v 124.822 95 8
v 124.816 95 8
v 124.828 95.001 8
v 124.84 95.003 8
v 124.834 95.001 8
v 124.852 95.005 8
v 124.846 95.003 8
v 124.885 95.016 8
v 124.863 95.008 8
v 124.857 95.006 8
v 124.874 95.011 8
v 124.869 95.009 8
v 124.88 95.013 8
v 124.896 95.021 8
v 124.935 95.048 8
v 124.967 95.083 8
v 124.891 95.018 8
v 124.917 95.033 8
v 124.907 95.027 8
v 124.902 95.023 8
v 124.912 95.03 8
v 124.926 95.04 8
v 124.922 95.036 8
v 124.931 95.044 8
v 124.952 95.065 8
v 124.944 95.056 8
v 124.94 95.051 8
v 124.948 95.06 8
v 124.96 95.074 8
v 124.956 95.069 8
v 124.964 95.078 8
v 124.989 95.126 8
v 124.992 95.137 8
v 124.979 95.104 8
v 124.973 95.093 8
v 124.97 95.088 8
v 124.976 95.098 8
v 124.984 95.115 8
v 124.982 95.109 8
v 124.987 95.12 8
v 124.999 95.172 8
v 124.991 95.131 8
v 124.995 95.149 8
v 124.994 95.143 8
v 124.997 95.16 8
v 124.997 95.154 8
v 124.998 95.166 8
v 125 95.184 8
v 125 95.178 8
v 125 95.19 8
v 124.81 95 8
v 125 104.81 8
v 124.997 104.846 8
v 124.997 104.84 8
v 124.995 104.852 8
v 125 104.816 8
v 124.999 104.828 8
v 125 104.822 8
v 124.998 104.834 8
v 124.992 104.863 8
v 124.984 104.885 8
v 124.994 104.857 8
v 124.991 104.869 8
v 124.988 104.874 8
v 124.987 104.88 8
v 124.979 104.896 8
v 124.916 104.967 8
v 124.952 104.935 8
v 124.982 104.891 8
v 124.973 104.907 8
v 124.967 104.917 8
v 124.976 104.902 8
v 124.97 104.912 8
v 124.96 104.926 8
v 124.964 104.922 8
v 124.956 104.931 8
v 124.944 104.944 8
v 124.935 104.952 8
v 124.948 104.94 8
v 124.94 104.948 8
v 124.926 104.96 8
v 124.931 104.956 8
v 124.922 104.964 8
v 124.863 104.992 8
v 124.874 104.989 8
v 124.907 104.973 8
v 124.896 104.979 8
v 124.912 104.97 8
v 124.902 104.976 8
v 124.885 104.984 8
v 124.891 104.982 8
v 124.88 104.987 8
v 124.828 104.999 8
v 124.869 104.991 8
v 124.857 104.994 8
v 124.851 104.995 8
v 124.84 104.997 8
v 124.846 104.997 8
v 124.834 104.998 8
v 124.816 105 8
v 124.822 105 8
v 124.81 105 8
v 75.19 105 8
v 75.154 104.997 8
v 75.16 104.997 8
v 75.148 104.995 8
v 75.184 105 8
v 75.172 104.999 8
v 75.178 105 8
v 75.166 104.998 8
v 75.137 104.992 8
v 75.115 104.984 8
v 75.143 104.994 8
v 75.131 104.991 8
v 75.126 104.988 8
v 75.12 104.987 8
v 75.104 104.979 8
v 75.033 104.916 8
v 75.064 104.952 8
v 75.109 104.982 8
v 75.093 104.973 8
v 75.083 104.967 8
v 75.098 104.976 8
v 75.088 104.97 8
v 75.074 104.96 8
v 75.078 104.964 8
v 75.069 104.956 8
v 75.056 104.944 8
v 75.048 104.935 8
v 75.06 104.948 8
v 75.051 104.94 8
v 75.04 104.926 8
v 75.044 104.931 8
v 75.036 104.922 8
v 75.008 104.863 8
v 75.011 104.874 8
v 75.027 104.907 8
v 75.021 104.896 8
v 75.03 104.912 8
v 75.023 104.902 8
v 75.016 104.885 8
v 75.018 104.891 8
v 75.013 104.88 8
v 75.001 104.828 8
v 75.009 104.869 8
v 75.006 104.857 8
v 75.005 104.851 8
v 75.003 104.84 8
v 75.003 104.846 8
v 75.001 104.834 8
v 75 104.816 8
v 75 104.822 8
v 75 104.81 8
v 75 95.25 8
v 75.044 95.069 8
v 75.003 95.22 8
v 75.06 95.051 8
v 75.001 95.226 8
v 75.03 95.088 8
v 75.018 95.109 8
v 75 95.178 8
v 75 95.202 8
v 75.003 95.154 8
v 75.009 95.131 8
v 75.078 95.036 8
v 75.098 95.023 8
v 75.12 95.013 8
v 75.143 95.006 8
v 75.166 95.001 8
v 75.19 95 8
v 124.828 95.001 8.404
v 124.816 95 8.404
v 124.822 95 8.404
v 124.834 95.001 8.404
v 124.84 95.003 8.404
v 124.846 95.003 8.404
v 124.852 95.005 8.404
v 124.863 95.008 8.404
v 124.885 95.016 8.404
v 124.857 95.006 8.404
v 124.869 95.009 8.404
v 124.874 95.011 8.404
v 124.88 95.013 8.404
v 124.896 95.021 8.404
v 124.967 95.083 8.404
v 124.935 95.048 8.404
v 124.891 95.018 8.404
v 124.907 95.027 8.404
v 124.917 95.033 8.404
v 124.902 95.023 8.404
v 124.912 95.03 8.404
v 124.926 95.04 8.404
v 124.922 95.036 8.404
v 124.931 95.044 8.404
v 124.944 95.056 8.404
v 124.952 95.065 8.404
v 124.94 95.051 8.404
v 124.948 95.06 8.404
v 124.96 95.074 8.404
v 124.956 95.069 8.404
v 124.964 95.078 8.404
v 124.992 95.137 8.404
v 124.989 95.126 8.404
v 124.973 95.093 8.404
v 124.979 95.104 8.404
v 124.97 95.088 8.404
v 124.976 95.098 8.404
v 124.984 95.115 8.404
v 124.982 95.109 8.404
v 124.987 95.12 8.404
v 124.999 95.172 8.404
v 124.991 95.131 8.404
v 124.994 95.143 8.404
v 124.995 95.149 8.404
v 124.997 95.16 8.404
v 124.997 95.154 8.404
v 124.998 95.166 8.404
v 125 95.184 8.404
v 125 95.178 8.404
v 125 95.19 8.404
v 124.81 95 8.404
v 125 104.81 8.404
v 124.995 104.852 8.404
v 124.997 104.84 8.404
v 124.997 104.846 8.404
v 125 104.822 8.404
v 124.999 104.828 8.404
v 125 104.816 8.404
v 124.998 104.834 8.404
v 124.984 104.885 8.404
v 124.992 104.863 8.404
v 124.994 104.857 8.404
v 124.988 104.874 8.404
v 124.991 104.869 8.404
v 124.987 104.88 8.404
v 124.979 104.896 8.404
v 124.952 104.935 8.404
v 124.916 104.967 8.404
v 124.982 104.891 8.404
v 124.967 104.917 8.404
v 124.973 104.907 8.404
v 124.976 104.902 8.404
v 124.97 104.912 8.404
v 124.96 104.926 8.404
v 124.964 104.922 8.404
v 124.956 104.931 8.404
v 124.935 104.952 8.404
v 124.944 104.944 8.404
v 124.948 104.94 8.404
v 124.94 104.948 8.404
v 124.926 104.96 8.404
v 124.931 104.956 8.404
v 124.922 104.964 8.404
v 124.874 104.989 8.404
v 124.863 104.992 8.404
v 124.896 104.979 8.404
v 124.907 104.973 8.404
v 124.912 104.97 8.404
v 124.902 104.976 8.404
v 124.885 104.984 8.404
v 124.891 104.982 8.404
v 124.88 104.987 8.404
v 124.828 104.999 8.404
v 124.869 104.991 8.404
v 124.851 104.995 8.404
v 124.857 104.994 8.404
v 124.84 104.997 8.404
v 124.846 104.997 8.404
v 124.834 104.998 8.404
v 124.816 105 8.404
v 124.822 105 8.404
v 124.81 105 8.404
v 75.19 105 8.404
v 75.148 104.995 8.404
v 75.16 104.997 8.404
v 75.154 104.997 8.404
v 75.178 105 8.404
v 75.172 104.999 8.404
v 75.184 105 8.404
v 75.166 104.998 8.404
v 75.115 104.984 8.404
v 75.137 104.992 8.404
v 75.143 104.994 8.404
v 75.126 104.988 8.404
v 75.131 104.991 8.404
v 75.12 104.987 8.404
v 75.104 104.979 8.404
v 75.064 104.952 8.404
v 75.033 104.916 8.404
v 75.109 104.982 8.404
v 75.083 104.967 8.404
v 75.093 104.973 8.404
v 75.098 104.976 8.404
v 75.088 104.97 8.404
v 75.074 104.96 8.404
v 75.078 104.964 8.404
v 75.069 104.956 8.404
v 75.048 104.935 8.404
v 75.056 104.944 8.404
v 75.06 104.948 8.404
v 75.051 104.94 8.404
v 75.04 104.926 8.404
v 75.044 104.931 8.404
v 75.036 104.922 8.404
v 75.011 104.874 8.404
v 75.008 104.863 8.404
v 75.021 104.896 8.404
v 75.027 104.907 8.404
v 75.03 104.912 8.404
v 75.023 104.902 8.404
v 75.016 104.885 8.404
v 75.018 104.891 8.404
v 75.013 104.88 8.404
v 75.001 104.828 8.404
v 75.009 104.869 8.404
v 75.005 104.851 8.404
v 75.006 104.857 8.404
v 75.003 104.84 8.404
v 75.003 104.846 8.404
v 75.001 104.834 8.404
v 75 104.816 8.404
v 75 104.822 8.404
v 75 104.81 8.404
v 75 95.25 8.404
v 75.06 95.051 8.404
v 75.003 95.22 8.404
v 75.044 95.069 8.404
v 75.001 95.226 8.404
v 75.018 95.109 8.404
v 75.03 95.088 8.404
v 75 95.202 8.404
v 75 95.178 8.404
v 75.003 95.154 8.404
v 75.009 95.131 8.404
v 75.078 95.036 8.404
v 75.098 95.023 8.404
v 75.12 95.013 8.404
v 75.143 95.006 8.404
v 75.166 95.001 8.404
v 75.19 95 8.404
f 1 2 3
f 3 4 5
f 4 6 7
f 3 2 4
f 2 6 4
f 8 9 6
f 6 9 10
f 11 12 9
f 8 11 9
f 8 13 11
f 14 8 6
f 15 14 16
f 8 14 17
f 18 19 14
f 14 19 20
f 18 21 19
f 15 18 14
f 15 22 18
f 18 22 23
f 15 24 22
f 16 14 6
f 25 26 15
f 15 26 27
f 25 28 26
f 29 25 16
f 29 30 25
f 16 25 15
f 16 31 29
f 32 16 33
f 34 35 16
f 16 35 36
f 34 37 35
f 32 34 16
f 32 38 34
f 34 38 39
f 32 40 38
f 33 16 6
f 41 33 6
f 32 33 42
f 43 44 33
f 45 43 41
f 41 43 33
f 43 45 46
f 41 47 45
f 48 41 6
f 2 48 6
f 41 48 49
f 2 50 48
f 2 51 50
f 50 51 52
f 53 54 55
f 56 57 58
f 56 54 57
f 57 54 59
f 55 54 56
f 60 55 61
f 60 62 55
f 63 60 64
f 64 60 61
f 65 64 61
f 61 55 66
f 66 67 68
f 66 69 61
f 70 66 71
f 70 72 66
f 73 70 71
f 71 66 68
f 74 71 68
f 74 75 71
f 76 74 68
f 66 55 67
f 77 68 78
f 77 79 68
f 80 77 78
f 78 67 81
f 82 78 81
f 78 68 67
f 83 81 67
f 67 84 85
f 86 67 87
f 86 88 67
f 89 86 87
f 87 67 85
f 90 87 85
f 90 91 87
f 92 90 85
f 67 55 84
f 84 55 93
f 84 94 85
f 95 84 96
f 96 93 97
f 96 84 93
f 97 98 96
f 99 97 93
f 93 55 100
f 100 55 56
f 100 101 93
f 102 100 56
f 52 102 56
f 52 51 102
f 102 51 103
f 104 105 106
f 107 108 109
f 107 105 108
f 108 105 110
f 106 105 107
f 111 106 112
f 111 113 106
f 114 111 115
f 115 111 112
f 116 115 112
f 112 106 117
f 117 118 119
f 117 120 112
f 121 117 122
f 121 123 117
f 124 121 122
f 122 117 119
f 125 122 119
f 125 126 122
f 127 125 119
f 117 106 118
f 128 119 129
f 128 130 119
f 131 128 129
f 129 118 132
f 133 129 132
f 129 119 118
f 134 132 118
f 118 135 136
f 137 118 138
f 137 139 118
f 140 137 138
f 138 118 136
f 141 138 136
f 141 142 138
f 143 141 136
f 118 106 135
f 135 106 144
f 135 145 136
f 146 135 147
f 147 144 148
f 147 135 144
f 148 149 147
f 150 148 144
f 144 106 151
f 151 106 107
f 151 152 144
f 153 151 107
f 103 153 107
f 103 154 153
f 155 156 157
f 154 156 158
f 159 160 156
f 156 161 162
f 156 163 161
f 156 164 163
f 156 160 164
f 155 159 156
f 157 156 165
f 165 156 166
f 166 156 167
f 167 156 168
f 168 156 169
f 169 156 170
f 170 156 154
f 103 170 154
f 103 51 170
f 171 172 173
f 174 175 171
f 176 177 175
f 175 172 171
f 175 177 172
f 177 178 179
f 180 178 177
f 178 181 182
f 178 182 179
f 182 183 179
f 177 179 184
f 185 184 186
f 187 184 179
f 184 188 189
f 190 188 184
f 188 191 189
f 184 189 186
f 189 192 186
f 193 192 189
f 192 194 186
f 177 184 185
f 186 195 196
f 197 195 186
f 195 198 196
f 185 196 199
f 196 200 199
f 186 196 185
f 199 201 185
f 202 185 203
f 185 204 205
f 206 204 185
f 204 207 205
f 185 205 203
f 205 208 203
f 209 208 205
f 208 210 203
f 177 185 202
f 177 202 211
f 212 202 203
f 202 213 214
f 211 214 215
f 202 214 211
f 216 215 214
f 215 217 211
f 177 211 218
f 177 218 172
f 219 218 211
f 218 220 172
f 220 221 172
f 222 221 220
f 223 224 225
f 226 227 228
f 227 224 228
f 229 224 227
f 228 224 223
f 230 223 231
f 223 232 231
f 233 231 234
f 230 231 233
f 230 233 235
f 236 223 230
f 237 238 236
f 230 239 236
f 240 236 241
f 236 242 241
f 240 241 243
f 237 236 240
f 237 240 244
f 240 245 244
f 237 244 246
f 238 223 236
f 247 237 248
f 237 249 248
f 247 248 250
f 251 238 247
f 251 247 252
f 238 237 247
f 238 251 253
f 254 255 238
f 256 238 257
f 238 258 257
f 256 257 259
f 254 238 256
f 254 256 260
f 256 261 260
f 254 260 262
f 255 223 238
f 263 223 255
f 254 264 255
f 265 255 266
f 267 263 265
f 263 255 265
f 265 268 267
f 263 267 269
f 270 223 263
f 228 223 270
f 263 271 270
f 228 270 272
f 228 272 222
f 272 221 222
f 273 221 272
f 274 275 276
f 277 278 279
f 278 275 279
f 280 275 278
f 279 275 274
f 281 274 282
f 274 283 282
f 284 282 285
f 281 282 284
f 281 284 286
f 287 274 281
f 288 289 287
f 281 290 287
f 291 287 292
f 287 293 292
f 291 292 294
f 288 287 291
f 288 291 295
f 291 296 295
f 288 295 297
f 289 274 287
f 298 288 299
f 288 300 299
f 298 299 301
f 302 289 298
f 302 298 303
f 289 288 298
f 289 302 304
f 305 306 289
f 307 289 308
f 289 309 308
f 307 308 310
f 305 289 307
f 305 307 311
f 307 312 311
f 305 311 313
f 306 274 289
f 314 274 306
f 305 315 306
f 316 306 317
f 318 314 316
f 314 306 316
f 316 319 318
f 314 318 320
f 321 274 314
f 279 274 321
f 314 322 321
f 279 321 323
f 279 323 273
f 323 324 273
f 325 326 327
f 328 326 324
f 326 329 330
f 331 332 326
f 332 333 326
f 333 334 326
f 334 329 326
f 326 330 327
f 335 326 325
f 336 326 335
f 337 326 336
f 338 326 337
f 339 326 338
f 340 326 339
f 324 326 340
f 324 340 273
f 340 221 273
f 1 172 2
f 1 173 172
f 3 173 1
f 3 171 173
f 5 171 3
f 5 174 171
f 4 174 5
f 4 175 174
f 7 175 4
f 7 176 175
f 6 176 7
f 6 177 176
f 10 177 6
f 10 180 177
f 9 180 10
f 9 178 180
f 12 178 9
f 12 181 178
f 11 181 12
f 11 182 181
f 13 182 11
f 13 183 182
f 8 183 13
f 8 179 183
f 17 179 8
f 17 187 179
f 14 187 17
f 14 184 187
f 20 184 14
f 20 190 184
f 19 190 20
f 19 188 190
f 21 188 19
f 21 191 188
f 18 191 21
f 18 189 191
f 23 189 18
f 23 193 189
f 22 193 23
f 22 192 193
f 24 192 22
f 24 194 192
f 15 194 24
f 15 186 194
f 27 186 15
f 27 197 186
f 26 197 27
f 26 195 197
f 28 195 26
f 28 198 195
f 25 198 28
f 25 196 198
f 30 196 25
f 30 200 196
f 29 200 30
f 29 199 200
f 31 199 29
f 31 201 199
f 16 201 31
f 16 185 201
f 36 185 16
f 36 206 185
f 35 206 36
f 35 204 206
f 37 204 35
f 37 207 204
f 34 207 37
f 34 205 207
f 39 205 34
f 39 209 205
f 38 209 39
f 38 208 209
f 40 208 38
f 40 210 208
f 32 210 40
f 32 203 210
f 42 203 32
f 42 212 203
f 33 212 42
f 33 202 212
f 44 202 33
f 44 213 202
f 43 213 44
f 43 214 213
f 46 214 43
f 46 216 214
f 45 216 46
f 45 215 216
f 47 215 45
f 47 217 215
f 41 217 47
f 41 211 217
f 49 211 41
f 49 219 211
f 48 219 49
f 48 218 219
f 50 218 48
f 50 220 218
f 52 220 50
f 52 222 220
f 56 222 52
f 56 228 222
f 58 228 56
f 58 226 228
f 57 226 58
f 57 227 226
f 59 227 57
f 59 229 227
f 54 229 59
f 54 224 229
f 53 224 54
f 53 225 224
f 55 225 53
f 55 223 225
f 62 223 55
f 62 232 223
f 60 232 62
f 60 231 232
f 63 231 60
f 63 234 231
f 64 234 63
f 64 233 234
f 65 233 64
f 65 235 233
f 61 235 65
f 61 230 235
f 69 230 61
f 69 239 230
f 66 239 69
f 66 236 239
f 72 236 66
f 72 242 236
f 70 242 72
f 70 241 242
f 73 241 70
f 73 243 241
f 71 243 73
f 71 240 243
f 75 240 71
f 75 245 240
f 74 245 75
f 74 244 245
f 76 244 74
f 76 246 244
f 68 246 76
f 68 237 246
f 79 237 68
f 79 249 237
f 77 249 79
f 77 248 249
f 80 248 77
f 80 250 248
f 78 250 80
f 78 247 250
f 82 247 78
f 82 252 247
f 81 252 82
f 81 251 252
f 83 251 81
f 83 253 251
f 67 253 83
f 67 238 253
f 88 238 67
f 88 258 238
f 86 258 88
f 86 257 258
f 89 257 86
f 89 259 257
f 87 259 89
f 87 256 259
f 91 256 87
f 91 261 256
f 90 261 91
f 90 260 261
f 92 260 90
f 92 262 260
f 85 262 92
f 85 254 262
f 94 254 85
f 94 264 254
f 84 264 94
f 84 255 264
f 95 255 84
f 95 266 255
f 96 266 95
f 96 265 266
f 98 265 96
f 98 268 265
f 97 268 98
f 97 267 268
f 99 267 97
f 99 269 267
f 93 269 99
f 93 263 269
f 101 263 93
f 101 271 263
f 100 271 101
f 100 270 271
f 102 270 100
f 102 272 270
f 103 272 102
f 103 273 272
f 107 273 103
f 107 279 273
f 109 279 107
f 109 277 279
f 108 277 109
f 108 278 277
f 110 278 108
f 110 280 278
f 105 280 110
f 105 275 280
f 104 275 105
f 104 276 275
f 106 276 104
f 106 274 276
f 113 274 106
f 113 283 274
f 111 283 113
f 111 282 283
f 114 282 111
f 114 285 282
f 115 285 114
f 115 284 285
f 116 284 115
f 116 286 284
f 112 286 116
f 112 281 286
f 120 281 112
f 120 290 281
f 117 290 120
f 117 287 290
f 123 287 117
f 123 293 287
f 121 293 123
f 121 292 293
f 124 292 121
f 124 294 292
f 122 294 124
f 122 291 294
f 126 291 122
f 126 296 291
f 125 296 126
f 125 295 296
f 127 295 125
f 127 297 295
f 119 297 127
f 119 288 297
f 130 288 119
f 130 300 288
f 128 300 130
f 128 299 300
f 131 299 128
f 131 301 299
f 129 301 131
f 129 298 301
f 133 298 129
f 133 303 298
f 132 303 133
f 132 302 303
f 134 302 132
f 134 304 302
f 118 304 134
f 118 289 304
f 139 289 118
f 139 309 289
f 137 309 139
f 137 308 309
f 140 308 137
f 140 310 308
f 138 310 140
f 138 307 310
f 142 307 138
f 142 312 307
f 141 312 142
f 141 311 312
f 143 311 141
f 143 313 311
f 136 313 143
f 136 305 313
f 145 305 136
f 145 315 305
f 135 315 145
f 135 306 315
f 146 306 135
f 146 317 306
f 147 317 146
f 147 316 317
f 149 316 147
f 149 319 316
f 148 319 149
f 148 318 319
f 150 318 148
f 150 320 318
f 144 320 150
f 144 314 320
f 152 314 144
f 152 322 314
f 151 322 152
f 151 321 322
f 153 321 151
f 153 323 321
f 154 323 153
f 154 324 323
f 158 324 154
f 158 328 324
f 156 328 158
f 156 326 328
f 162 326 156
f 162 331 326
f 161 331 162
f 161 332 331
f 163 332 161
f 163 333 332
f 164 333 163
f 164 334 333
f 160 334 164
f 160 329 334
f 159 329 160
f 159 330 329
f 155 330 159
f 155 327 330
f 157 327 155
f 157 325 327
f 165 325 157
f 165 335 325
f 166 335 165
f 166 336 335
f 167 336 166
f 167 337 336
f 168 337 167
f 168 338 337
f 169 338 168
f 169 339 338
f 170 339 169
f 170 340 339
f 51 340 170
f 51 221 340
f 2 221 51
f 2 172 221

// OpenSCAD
module drawBasicShape(x1, y1, x2, y2, width)
{
	length = sqrt((x1-x2)*(x1-x2) + (y1-y2)*(y1-y2));
	if (width!=0.0) {
		square(size = [width, length], center = false);
		translate([width/2.0, 0, 0]) circle(d=width);
		translate([width/2.0, length, 0]) circle(d=width);
	}
}

module translateAndRotate(x1, y1, x2, y2, width)
{
	if (width != 0.0) {
		angle = atan((y2-y1)/(x2-x1)) +270;
		if (x2>=x1) {
			translate([x1, y1, 0.0]) rotate([0.0, 0.0, angle]) translate([-width/2.0, 0.0, 0.0]) scale([1.0, 1.0, 1.0]) drawBasicShape(x1, y1, x2, y2, width);
		}
		else {
			translate([x1, y1, 0.0]) rotate([0.0, 0.0, angle+180]) translate([-width/2.0, 0.0, 0.0]) scale([1.0, 1.0, 1.0]) drawBasicShape(x1, y1, x2, y2, width);		}
	}
}

$fn=50;

points19 = [
[75.77800000, 95.77800000, 0.00000000],
[124.22200000, 95.77800000, 0.37999548],
[124.22200000, 104.22200000, 0.37997788],
[75.77800000, 104.22200000, 0.37999672],
[75.77800000, 95.83800000, 0.37997423],
[75.48400000, 95.48400000, 0.00000000],
[124.51600000, 95.48400000, 0.37999868],
[124.51600000, 104.51600000, 0.37998977],
[75.48400000, 104.51600000, 0.37999746],
[75.48400000, 95.54400000, 0.37999314],
[75.19000000, 95.19000000, 0.00000000],
[124.81000000, 95.19000000, 0.37999939],
[124.81000000, 104.81000000, 0.38000021],
[75.19000000, 104.81000000, 0.38000060],
[75.19000000, 95.25000000, 0.37999715],
[75.53600000, 95.39000000, 0.00000000],
[76.11100000, 95.94600000, 0.00000000],
[75.94600000, 96.11100000, 0.37961375],
[75.94600000, 96.52800000, 0.38001190],
[76.52800000, 95.94600000, 0.37989934],
[76.94500000, 95.94600000, 0.38015610],
[75.94600000, 96.94500000, 0.37994651],
[75.94600000, 97.36200000, 0.38001190],
[77.36200000, 95.94600000, 0.37999592],
[77.77900000, 95.94600000, 0.38001190],
[75.94600000, 97.77900000, 0.37999966],
[75.94600000, 98.19600000, 0.38015610],
[78.19600000, 95.94600000, 0.38000201],
[78.61300000, 95.94600000, 0.38001190],
[75.94600000, 98.61300000, 0.38001957],
[75.94600000, 99.03000000, 0.38001190],
[79.03000000, 95.94600000, 0.38001859],
[79.44700000, 95.94600000, 0.38001190],
[75.94600000, 99.44700000, 0.38002999],
[75.94600000, 99.86400000, 0.38001190],
[79.86400000, 95.94600000, 0.38002811],
[80.28100000, 95.94600000, 0.38001190],
[75.94600000, 100.28100000, 0.38002660],
[75.94600000, 100.69800000, 0.38001190],
[80.69800000, 95.94600000, 0.38003429],
[81.11500000, 95.94600000, 0.38001190],
[75.94600000, 101.11500000, 0.38003252],
[75.94600000, 101.53300000, 0.37930814],
[81.53300000, 95.94600000, 0.37997836],
[81.95000000, 95.94600000, 0.38001190],
[75.94600000, 101.95000000, 0.37998072],
[75.94600000, 102.36700000, 0.38015610],
[82.36700000, 95.94600000, 0.37998277],
[82.78400000, 95.94600000, 0.38015610],
[75.94600000, 102.78400000, 0.37999079],
[75.94600000, 103.20100000, 0.38001190],
[83.20100000, 95.94600000, 0.37999203],
[83.61800000, 95.94600000, 0.38001190],
[75.94600000, 103.61800000, 0.37999868],
[75.95600000, 104.02400000, 0.38048727],
[84.03500000, 95.94600000, 0.38000275],
[84.45200000, 95.94600000, 0.38001190],
[76.34400000, 104.05400000, 0.38000229],
[76.76100000, 104.05400000, 0.38001190],
[84.86900000, 95.94600000, 0.38000754],
[85.28600000, 95.94600000, 0.38001190],
[77.17800000, 104.05400000, 0.38000229],
[77.59500000, 104.05400000, 0.38015610],
[85.70300000, 95.94600000, 0.38000229],
[86.12000000, 95.94600000, 0.38001190],
[78.01200000, 104.05400000, 0.38000754],
[78.42900000, 104.05400000, 0.38001190],
[86.53700000, 95.94600000, 0.38000229],
[86.95400000, 95.94600000, 0.38001190],
[78.84600000, 104.05400000, 0.38000754],
[79.26300000, 104.05400000, 0.38001190],
[87.37100000, 95.94600000, 0.38000229],
[87.78900000, 95.94600000, 0.37945200],
[79.68000000, 104.05400000, 0.37998415],
[80.09700000, 104.05400000, 0.38001190],
[88.20600000, 95.94600000, 0.37998940],
[88.62300000, 95.94600000, 0.38001190],
[80.51500000, 104.05400000, 0.38000229],
[80.93200000, 104.05400000, 0.38001190],
[89.04000000, 95.94600000, 0.38000754],
[89.45700000, 95.94600000, 0.38001190],
[81.34900000, 104.05400000, 0.38000229],
[81.76600000, 104.05400000, 0.38015610],
[89.87400000, 95.94600000, 0.38000229],
[90.29100000, 95.94600000, 0.38001190],
[82.18300000, 104.05400000, 0.38000754],
[82.60000000, 104.05400000, 0.38001190],
[90.70800000, 95.94600000, 0.38000229],
[91.12500000, 95.94600000, 0.38001190],
[83.01700000, 104.05400000, 0.38000754],
[83.43400000, 104.05400000, 0.38001190],
[91.54200000, 95.94600000, 0.38000229],
[91.95900000, 95.94600000, 0.38015610],
[83.85100000, 104.05400000, 0.38000229],
[84.26800000, 104.05400000, 0.38001190],
[92.37600000, 95.94600000, 0.38000754],
[92.79300000, 95.94600000, 0.38001190],
[84.68500000, 104.05400000, 0.38000229],
[85.10200000, 104.05400000, 0.38001190],
[93.21000000, 95.94600000, 0.38000754],
[93.62700000, 95.94600000, 0.38001190],
[85.51900000, 104.05400000, 0.38000229],
[85.93600000, 104.05400000, 0.38015610],
[94.04400000, 95.94600000, 0.38000229],
[94.46200000, 95.94600000, 0.37930814],
[86.35300000, 104.05400000, 0.37998940],
[86.77000000, 104.05400000, 0.38001190],
[94.87900000, 95.94600000, 0.37998415],
[95.29600000, 95.94600000, 0.38001190],
[87.18800000, 104.05400000, 0.38000754],
[87.60500000, 104.05400000, 0.38001190],
[95.71300000, 95.94600000, 0.38000229],
[96.13000000, 95.94600000, 0.38015610],
[88.02200000, 104.05400000, 0.38000229],
[88.43900000, 104.05400000, 0.38001190],
[96.54700000, 95.94600000, 0.38000229],
[96.96400000, 95.94600000, 0.38015610],
[88.85600000, 104.05400000, 0.38000229],
[89.27300000, 104.05400000, 0.38001190],
[97.38100000, 95.94600000, 0.38000754],
[97.79800000, 95.94600000, 0.38001190],
[89.69000000, 104.05400000, 0.38000229],
[90.10700000, 104.05400000, 0.38001190],
[98.21500000, 95.94600000, 0.38000754],
[98.63200000, 95.94600000, 0.38001190],
[90.52400000, 104.05400000, 0.38000229],
[90.94100000, 104.05400000, 0.38015610],
[99.04900000, 95.94600000, 0.38000229],
[99.46600000, 95.94600000, 0.38001190],
[91.35800000, 104.05400000, 0.38000754],
[91.77500000, 104.05400000, 0.38001190],
[99.88300000, 95.94600000, 0.38000229],
[100.30000000, 95.94600000, 0.38001190],
[92.19200000, 104.05400000, 0.38000754],
[92.60900000, 104.05400000, 0.38001190],
[100.71800000, 95.94600000, 0.37998415],
[101.13500000, 95.94600000, 0.38015610],
[93.02600000, 104.05400000, 0.37998415],
[93.44400000, 104.05400000, 0.37930814],
[101.55200000, 95.94600000, 0.38000754],
[101.96900000, 95.94600000, 0.38001190],
[93.86100000, 104.05400000, 0.38000229],
[94.27800000, 104.05400000, 0.38001190],
[102.38600000, 95.94600000, 0.38000754],
[102.80300000, 95.94600000, 0.38001190],
[94.69500000, 104.05400000, 0.38000229],
[95.11200000, 104.05400000, 0.38015610],
[103.22000000, 95.94600000, 0.38000229],
[103.63700000, 95.94600000, 0.38001190],
[95.52900000, 104.05400000, 0.38000754],
[95.94600000, 104.05400000, 0.38001190],
[104.05400000, 95.94600000, 0.38000229],
[104.47100000, 95.94600000, 0.38015610],
[96.36300000, 104.05400000, 0.38000229],
[96.78000000, 104.05400000, 0.38001190],
[104.88800000, 95.94600000, 0.38000229],
[105.30500000, 95.94600000, 0.38015610],
[97.19700000, 104.05400000, 0.38000229],
[97.61400000, 104.05400000, 0.38001190],
[105.72200000, 95.94600000, 0.38000754],
[106.13900000, 95.94600000, 0.38001190],
[98.03100000, 104.05400000, 0.38000229],
[98.44800000, 104.05400000, 0.38015610],
[106.55600000, 95.94600000, 0.38000229],
[106.97300000, 95.94600000, 0.38001190],
[98.86500000, 104.05400000, 0.38000229],
[99.28200000, 104.05400000, 0.38015610],
[107.39100000, 95.94600000, 0.37998415],
[107.80800000, 95.94600000, 0.38001190],
[99.69900000, 104.05400000, 0.37998940],
[100.11700000, 104.05400000, 0.37930814],
[108.22500000, 95.94600000, 0.38000229],
[108.64200000, 95.94600000, 0.38015610],
[100.53400000, 104.05400000, 0.38000229],
[100.95100000, 104.05400000, 0.38001190],
[109.05900000, 95.94600000, 0.38000229],
[109.47600000, 95.94600000, 0.38015610],
[101.36800000, 104.05400000, 0.38000229],
[101.78500000, 104.05400000, 0.38001190],
[109.89300000, 95.94600000, 0.38000754],
[110.31000000, 95.94600000, 0.38001190],
[102.20200000, 104.05400000, 0.38000229],
[102.61900000, 104.05400000, 0.38015610],
[110.72700000, 95.94600000, 0.38000229],
[111.14400000, 95.94600000, 0.38001190],
[103.03600000, 104.05400000, 0.38000229],
[103.45300000, 104.05400000, 0.38015610],
[111.56100000, 95.94600000, 0.38000229],
[111.97800000, 95.94600000, 0.38001190],
[103.87000000, 104.05400000, 0.38000754],
[104.28700000, 104.05400000, 0.38001190],
[112.39500000, 95.94600000, 0.38000229],
[112.81200000, 95.94600000, 0.38001190],
[104.70400000, 104.05400000, 0.38000754],
[105.12100000, 104.05400000, 0.38001190],
[113.22900000, 95.94600000, 0.38000229],
[113.64700000, 95.94600000, 0.37945200],
[105.53800000, 104.05400000, 0.37998415],
[105.95500000, 104.05400000, 0.38001190],
[114.06400000, 95.94600000, 0.37998940],
[114.48100000, 95.94600000, 0.38001190],
[106.37300000, 104.05400000, 0.38000229],
[106.79000000, 104.05400000, 0.38001190],
[114.89800000, 95.94600000, 0.38000754],
[115.31500000, 95.94600000, 0.38001190],
[107.20700000, 104.05400000, 0.38000229],
[107.62400000, 104.05400000, 0.38015610],
[115.73200000, 95.94600000, 0.38000229],
[116.14900000, 95.94600000, 0.38001190],
[108.04100000, 104.05400000, 0.38000754],
[108.45800000, 104.05400000, 0.38001190],
[116.56600000, 95.94600000, 0.38000229],
[116.98300000, 95.94600000, 0.38001190],
[108.87500000, 104.05400000, 0.38000754],
[109.29200000, 104.05400000, 0.38001190],
[117.40000000, 95.94600000, 0.38000229],
[117.81700000, 95.94600000, 0.38015610],
[109.70900000, 104.05400000, 0.38000229],
[110.12600000, 104.05400000, 0.38001190],
[118.23400000, 95.94600000, 0.38000754],
[118.65100000, 95.94600000, 0.38001190],
[110.54300000, 104.05400000, 0.38000229],
[110.96000000, 104.05400000, 0.38001190],
[119.06800000, 95.94600000, 0.38000754],
[119.48500000, 95.94600000, 0.38001190],
[111.37700000, 104.05400000, 0.38000229],
[111.79400000, 104.05400000, 0.38015610],
[119.90200000, 95.94600000, 0.38000229],
[120.32000000, 95.94600000, 0.37930814],
[112.21100000, 104.05400000, 0.37998940],
[112.62900000, 104.05400000, 0.37930814],
[120.73700000, 95.94600000, 0.38000229],
[121.15400000, 95.94600000, 0.38001190],
[113.04600000, 104.05400000, 0.38000754],
[113.46300000, 104.05400000, 0.38001190],
[121.57100000, 95.94600000, 0.38000229],
[121.98800000, 95.94600000, 0.38015610],
[113.88000000, 104.05400000, 0.38000229],
[114.29700000, 104.05400000, 0.38001190],
[122.40500000, 95.94600000, 0.38000754],
[122.82200000, 95.94600000, 0.38001190],
[114.71400000, 104.05400000, 0.38000229],
[115.13100000, 104.05400000, 0.38001190],
[123.23900000, 95.94600000, 0.38000754],
[123.65600000, 95.94600000, 0.38001190],
[115.54800000, 104.05400000, 0.38000229],
[115.96500000, 104.05400000, 0.38015610],
[124.04400000, 95.97500000, 0.37998455],
[124.05400000, 96.38200000, 0.37961606],
[116.38200000, 104.05400000, 0.37999868],
[116.79900000, 104.05400000, 0.38015610],
[124.05400000, 96.79900000, 0.37999203],
[124.05400000, 97.21600000, 0.38015610],
[117.21600000, 104.05400000, 0.37999079],
[117.63300000, 104.05400000, 0.38001190],
[124.05400000, 97.63300000, 0.37998939],
[124.05400000, 98.05000000, 0.38001190],
[118.05000000, 104.05400000, 0.37998780],
[118.46700000, 104.05400000, 0.38001190],
[124.05400000, 98.46700000, 0.37998597],
[124.05400000, 98.88400000, 0.38001190],
[118.88400000, 104.05400000, 0.37997562],
[119.30200000, 104.05400000, 0.37930814],
[124.05400000, 99.30200000, 0.38003429],
[124.05400000, 99.71900000, 0.38001190],
[119.71900000, 104.05400000, 0.38003640],
[120.13600000, 104.05400000, 0.38001190],
[124.05400000, 100.13600000, 0.38002811],
[124.05400000, 100.55300000, 0.38001190],
[120.55300000, 104.05400000, 0.38002999],
[120.97000000, 104.05400000, 0.38001190],
[124.05400000, 100.97000000, 0.38001859],
[124.05400000, 101.38700000, 0.38015610],
[121.38700000, 104.05400000, 0.38001957],
[121.80400000, 104.05400000, 0.38001190],
[124.05400000, 101.80400000, 0.38002091],
[124.05400000, 102.22100000, 0.38001190],
[122.22100000, 104.05400000, 0.37999966],
[122.63800000, 104.05400000, 0.38015610],
[124.05400000, 102.63800000, 0.37999592],
[124.05400000, 103.05500000, 0.38001190],
[123.05500000, 104.05400000, 0.37998907],
[123.47200000, 104.05400000, 0.38001190],
[124.05400000, 103.47200000, 0.37997240],
[124.05400000, 103.88900000, 0.38001190],
[123.88900000, 104.05400000, 0.37961375],
];

translate([0.0, 0.0, 8.00000000]) {
	linear_extrude(height = 0.40400000, center = false, convexity = 10, twist = 0) {
		union() {
			for( i=[0:len(points19)-2] ){ 
				x1 = points19[i][0];
				y1 = points19[i][1];
				x2 = points19[i+1][0];
				y2 = points19[i+1][1];
				width = points19[i+1][2];
				translateAndRotate(x1, y1, x2, y2, width);
			}
		}
	}
}
